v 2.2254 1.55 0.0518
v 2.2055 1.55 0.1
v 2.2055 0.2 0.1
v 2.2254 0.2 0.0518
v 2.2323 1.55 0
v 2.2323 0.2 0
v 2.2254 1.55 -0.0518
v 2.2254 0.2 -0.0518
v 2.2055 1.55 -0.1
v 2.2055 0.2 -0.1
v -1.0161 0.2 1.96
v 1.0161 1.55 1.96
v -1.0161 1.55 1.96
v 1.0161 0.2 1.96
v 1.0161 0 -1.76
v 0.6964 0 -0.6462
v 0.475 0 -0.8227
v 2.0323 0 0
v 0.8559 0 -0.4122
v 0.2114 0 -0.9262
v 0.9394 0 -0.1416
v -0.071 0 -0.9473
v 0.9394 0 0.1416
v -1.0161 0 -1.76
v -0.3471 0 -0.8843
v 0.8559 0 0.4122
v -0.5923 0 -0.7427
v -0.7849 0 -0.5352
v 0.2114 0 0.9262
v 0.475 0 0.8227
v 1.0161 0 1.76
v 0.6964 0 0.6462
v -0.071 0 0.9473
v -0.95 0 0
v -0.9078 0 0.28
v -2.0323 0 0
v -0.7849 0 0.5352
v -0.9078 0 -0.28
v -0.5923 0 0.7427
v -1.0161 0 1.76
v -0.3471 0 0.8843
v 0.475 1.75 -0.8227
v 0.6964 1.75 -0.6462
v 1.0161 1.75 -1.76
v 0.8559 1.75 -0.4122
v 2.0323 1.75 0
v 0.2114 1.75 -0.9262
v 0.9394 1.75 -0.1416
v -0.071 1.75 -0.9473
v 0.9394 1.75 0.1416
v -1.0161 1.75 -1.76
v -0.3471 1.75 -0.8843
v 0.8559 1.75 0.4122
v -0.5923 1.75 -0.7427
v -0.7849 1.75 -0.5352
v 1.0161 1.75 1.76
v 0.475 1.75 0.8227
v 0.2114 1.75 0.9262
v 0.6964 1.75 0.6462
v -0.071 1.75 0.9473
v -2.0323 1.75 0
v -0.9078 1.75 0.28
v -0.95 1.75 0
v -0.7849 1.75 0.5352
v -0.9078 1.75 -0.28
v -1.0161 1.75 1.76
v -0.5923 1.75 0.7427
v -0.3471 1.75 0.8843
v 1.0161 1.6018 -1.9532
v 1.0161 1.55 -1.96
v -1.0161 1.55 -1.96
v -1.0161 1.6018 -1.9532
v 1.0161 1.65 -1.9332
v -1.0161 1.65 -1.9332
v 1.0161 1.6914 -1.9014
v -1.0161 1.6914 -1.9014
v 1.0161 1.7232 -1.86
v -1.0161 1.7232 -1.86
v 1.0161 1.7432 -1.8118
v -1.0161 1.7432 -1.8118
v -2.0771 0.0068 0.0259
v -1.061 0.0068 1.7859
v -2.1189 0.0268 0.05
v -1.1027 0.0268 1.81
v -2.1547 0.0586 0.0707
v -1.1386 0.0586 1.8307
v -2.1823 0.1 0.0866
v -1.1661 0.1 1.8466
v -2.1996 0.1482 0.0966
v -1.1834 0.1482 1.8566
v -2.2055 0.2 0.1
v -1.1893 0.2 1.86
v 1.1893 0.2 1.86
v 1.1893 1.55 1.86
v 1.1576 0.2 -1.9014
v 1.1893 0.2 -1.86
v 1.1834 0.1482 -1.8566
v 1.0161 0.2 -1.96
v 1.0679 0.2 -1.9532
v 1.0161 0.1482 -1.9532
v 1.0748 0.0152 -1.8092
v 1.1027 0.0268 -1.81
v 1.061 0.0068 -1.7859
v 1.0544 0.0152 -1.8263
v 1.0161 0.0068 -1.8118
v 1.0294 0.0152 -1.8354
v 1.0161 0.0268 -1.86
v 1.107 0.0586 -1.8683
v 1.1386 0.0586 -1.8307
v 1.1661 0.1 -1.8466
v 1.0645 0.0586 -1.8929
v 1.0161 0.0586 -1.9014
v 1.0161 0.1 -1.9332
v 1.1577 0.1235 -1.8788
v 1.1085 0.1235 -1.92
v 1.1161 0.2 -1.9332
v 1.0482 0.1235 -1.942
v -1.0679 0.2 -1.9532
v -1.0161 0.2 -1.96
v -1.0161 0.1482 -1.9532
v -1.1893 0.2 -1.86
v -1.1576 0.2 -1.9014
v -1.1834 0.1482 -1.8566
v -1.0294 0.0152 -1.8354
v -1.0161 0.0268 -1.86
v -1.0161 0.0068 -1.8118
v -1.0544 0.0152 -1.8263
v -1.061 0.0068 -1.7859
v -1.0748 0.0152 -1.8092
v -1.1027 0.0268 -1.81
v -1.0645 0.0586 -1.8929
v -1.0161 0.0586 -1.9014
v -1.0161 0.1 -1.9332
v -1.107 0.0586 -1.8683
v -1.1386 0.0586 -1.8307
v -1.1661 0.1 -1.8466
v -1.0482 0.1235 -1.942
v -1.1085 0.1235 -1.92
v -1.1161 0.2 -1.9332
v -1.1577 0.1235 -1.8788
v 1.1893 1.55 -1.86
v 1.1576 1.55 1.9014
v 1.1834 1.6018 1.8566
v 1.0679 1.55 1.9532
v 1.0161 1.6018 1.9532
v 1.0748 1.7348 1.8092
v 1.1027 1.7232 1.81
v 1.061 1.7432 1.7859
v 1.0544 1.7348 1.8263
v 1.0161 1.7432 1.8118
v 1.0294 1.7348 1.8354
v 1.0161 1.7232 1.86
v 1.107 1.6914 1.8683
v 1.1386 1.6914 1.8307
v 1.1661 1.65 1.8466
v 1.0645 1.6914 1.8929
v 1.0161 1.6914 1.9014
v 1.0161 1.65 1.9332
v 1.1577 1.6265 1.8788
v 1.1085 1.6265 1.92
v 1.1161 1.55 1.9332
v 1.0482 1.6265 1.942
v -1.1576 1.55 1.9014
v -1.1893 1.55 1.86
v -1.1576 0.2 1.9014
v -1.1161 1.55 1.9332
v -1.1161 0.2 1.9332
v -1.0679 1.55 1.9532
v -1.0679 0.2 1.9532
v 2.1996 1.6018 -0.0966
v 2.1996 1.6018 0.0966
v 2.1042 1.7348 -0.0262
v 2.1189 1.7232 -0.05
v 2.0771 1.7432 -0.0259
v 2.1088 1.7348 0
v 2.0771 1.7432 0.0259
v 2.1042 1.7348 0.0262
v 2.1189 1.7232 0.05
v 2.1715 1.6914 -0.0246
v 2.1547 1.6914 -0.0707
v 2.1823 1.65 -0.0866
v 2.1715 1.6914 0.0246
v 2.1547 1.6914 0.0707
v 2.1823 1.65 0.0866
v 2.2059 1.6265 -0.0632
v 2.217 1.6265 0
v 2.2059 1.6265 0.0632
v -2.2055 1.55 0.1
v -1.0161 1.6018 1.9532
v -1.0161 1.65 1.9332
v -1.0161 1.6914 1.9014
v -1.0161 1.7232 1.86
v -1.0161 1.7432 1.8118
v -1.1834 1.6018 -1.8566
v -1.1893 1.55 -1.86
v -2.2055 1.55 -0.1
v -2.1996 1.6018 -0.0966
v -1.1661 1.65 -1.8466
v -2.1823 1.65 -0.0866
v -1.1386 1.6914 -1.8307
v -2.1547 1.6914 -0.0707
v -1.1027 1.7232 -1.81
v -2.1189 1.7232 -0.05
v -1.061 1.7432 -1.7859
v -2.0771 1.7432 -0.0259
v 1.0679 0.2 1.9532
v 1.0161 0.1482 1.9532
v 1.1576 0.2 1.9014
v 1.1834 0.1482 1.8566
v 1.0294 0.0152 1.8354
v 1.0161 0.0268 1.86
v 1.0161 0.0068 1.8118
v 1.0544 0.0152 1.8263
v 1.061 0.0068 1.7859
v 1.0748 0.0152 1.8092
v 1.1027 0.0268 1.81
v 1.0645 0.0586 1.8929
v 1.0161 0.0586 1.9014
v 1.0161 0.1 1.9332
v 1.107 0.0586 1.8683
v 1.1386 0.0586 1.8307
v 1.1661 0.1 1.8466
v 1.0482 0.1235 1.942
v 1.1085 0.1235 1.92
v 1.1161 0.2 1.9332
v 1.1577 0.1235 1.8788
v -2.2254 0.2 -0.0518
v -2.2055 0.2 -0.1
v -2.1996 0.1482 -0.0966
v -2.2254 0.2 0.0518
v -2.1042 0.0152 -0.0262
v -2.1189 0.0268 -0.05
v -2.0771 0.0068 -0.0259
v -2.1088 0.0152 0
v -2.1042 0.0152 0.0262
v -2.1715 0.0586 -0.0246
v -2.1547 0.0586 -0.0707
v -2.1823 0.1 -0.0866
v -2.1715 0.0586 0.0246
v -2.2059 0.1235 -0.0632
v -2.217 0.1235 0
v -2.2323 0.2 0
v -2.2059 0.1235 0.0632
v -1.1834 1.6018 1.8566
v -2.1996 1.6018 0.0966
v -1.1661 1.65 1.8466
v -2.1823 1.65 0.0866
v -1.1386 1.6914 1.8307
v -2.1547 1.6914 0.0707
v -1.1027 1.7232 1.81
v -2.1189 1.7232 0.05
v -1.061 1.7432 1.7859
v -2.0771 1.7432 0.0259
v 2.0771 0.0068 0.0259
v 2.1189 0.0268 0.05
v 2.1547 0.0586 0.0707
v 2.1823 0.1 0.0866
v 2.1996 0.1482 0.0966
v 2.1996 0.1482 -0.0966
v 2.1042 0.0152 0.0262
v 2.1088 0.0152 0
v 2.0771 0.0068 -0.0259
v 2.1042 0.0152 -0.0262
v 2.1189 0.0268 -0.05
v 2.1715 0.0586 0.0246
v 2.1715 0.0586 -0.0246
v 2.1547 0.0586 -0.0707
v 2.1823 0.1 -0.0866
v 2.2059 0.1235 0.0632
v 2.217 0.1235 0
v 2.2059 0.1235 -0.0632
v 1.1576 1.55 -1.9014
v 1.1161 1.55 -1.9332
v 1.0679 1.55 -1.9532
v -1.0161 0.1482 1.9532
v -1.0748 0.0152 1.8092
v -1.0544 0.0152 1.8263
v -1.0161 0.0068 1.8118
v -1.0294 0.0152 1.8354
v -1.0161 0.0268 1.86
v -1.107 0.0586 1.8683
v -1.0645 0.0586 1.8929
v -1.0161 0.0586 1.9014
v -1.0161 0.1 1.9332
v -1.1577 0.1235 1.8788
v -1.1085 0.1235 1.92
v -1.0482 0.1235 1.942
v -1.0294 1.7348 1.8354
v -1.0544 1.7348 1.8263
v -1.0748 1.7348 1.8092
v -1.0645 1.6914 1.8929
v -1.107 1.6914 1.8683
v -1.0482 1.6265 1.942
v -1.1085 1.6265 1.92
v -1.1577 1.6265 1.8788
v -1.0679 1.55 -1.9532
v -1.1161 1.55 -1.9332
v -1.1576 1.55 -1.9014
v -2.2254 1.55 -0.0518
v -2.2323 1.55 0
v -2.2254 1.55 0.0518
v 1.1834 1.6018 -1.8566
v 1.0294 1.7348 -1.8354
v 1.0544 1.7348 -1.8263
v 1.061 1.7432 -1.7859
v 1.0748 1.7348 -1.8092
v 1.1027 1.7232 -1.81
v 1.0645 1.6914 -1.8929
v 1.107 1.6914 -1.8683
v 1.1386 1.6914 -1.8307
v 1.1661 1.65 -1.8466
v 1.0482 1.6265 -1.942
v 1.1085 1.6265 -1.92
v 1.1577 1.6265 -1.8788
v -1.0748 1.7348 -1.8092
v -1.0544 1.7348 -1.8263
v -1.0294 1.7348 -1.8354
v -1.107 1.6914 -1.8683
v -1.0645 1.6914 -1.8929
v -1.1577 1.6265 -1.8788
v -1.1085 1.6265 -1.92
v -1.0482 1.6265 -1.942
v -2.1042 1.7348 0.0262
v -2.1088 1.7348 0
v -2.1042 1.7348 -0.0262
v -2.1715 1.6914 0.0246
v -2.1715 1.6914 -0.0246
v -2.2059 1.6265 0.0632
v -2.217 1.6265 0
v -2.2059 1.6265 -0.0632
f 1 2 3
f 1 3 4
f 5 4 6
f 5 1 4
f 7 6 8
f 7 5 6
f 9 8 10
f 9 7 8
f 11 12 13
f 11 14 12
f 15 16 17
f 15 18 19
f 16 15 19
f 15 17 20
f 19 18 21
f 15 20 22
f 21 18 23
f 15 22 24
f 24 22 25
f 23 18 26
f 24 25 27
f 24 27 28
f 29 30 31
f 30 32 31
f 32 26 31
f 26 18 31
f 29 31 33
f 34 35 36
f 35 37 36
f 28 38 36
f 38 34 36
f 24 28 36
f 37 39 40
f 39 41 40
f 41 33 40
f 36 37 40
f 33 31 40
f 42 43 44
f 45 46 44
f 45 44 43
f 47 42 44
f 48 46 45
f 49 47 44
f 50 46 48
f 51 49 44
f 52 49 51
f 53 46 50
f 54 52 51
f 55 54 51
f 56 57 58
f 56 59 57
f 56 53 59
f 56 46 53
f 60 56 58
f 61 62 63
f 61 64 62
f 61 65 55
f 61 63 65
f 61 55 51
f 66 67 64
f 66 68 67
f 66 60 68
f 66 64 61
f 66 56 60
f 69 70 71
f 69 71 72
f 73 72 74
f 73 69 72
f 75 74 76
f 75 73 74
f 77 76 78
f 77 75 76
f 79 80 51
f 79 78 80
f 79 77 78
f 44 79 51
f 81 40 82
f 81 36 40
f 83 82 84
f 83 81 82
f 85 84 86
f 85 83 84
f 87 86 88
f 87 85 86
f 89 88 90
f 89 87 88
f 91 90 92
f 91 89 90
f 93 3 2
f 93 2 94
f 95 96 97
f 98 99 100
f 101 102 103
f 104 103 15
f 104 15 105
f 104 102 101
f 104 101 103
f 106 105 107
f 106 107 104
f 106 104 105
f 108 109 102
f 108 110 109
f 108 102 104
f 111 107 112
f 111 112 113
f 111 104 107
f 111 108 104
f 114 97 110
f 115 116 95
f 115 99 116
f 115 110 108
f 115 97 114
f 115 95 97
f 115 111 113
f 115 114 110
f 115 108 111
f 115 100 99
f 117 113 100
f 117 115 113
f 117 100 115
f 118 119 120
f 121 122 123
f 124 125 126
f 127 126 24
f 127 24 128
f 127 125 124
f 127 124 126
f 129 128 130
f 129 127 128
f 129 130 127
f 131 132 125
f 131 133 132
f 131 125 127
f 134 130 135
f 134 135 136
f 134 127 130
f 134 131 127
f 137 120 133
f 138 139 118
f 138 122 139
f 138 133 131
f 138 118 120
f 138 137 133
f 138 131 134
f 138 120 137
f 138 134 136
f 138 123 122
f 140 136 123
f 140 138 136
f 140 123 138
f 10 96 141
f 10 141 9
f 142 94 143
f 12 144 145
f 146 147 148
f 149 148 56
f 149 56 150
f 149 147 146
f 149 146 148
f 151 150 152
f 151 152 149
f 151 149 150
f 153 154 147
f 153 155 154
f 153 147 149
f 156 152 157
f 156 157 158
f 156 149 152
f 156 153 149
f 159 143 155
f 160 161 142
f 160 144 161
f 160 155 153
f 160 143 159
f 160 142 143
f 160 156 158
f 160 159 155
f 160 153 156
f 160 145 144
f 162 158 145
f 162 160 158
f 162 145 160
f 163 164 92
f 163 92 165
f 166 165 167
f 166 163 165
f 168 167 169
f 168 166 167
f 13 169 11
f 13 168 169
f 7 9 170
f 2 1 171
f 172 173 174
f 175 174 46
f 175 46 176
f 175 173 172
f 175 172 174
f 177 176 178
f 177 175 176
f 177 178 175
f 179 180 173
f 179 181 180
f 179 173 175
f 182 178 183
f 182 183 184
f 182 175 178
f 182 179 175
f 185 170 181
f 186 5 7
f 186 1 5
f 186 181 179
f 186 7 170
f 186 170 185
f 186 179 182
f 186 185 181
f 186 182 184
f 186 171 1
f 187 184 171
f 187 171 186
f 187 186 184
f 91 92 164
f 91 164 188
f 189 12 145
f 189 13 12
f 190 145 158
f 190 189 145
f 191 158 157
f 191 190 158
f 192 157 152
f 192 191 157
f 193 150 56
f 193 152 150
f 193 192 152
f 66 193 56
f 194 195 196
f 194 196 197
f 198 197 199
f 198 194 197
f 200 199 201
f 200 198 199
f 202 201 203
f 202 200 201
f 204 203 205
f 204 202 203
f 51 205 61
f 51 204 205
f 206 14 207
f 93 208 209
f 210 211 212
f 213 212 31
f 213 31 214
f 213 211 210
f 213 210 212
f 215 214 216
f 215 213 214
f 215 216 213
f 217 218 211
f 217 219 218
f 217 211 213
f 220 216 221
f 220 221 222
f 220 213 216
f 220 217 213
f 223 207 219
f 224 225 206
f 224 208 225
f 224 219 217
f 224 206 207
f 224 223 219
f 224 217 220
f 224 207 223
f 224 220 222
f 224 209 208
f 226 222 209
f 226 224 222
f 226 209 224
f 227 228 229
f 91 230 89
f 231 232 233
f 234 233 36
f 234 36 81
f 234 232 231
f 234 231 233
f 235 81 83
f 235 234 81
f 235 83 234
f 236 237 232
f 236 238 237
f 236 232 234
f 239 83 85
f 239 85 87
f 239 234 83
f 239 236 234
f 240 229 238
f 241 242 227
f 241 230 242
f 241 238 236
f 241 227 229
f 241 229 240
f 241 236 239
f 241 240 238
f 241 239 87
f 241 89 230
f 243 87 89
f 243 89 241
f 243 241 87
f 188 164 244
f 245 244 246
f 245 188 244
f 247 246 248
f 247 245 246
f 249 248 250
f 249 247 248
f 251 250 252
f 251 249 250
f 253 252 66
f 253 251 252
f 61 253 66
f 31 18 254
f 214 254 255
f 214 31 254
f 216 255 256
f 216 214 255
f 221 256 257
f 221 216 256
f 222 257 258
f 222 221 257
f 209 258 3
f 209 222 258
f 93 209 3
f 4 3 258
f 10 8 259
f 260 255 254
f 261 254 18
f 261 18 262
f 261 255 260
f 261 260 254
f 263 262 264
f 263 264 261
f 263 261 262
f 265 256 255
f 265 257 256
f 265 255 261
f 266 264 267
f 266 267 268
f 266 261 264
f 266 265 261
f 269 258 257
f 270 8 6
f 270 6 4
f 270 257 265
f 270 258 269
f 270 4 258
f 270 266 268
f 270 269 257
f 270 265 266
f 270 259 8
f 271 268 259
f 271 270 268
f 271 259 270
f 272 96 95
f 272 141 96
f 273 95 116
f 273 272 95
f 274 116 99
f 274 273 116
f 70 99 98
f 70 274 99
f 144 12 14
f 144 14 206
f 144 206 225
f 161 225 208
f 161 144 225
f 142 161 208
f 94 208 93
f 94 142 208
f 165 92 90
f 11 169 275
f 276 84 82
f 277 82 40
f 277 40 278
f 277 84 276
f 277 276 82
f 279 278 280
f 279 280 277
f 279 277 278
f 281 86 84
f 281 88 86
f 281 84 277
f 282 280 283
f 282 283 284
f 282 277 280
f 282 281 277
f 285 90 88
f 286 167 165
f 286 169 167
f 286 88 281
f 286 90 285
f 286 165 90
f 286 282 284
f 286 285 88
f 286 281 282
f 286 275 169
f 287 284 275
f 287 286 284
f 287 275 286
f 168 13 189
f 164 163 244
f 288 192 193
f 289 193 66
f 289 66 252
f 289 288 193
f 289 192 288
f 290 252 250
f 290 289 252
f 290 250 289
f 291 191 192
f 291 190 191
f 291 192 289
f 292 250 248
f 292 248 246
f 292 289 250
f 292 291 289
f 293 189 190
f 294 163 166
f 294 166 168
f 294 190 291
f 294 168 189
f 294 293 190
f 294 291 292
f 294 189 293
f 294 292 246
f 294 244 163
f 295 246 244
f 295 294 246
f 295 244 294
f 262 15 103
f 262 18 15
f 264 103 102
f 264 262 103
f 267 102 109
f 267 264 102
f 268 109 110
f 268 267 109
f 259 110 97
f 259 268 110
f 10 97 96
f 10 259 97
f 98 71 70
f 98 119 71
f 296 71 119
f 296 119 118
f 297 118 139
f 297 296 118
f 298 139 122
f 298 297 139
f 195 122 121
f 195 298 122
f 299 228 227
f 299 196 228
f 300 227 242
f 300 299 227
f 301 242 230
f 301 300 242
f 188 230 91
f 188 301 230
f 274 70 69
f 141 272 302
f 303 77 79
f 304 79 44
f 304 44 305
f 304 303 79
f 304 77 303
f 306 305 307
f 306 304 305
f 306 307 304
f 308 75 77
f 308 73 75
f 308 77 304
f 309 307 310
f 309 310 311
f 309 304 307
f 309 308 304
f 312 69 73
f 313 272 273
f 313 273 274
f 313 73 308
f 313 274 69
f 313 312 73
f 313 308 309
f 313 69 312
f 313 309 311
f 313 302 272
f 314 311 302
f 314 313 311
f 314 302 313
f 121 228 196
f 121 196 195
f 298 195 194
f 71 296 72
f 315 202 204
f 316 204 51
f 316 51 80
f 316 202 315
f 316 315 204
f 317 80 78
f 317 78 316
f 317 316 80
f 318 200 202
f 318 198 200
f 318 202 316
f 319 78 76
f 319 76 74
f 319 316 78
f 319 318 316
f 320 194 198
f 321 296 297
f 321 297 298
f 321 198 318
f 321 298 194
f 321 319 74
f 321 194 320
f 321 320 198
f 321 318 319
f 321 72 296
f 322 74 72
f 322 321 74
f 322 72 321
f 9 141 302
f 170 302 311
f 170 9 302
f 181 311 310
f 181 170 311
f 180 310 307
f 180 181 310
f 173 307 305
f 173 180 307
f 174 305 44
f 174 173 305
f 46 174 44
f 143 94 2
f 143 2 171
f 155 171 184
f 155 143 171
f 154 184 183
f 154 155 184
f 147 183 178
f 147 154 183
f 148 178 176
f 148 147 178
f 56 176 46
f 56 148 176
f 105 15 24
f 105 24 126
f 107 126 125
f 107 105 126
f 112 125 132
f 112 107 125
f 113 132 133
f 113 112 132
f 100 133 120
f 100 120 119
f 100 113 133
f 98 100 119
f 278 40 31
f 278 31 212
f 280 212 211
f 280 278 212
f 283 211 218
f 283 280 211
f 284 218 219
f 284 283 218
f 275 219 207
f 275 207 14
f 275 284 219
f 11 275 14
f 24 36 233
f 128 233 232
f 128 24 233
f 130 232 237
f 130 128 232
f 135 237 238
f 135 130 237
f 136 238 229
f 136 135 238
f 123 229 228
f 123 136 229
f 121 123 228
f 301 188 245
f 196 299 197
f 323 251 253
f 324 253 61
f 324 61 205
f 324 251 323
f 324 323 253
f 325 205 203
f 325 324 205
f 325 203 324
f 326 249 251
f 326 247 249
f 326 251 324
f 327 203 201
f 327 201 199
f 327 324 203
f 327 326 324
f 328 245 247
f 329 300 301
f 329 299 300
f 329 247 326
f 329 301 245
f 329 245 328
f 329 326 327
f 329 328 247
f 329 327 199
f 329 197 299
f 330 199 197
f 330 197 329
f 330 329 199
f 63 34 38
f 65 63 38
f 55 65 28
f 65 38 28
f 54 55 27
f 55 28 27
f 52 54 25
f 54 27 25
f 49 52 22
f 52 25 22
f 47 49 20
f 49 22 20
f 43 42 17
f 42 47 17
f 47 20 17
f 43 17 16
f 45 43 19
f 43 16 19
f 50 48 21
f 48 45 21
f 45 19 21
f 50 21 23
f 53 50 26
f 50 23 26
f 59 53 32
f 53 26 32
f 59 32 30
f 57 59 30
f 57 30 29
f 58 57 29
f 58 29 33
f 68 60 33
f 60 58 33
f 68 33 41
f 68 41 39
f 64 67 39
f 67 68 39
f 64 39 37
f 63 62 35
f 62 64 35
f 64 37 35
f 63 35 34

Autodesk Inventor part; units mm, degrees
ref_plane "YZ Plane" through (0, 0, 0) normal (1, 0, 0) x (0, 1, 0)
ref_plane "XZ Plane" through (0, 0, 0) normal (0, 1, 0) x (-1, 0, 0)
ref_plane "XY Plane" through (0, 0, 0) normal (0, 0, 1) x (1, 0, 0)
sketch "Sketch1" plane through (0, 0, 0) normal (0, 1, 0) x (-1, 0, 0)
  line L0 (2.2632, 0) -> (1.1316, -1.96)
  line L1 (1.1316, -1.96) -> (-1.1316, -1.96)
  line L2 (-1.1316, -1.96) -> (-2.2632, 0)
  line L3 (-2.2632, 0) -> (-1.1316, 1.96)
  line L4 (-1.1316, 1.96) -> (1.1316, 1.96)
  line L5 (1.1316, 1.96) -> (2.2632, 0)
  circle A0 centre (0, 0) radius 0.95
  dimension "d0" = 3.92
  dimension "d1" = 1.9
extrude "Extrusion1" add sketch "Sketch1" along normal blind 1.75
fillet "Fillet1" radius 0.2 18 edges at (1.6974, 1.75, 0.98) (0, 1.75, 1.96) (1.1316, 0.875, 1.96) (0, 0, 1.96) (-1.1316, 0.875, 1.96) (1.6974, 0, 0.98) (2.2632, 0.875, 0) (1.1316, 0.875, -1.96) (1.6974, 1.75, -0.98) (1.6974, 0, -0.98) (-1.1316, 0.875, -1.96) (0, 1.75, -1.96) (0, 0, -1.96) (-1.6974, 1.75, 0.98) (-1.6974, 1.75, -0.98) (-2.2632, 0.875, 0) (-1.6974, 0, -0.98) (-1.6974, 0, 0.98)
thread "Thread1" size "M2x0.4" class "6H" standard "ANSI Metric M Profile" full length
properties part number "M2 Nut"
